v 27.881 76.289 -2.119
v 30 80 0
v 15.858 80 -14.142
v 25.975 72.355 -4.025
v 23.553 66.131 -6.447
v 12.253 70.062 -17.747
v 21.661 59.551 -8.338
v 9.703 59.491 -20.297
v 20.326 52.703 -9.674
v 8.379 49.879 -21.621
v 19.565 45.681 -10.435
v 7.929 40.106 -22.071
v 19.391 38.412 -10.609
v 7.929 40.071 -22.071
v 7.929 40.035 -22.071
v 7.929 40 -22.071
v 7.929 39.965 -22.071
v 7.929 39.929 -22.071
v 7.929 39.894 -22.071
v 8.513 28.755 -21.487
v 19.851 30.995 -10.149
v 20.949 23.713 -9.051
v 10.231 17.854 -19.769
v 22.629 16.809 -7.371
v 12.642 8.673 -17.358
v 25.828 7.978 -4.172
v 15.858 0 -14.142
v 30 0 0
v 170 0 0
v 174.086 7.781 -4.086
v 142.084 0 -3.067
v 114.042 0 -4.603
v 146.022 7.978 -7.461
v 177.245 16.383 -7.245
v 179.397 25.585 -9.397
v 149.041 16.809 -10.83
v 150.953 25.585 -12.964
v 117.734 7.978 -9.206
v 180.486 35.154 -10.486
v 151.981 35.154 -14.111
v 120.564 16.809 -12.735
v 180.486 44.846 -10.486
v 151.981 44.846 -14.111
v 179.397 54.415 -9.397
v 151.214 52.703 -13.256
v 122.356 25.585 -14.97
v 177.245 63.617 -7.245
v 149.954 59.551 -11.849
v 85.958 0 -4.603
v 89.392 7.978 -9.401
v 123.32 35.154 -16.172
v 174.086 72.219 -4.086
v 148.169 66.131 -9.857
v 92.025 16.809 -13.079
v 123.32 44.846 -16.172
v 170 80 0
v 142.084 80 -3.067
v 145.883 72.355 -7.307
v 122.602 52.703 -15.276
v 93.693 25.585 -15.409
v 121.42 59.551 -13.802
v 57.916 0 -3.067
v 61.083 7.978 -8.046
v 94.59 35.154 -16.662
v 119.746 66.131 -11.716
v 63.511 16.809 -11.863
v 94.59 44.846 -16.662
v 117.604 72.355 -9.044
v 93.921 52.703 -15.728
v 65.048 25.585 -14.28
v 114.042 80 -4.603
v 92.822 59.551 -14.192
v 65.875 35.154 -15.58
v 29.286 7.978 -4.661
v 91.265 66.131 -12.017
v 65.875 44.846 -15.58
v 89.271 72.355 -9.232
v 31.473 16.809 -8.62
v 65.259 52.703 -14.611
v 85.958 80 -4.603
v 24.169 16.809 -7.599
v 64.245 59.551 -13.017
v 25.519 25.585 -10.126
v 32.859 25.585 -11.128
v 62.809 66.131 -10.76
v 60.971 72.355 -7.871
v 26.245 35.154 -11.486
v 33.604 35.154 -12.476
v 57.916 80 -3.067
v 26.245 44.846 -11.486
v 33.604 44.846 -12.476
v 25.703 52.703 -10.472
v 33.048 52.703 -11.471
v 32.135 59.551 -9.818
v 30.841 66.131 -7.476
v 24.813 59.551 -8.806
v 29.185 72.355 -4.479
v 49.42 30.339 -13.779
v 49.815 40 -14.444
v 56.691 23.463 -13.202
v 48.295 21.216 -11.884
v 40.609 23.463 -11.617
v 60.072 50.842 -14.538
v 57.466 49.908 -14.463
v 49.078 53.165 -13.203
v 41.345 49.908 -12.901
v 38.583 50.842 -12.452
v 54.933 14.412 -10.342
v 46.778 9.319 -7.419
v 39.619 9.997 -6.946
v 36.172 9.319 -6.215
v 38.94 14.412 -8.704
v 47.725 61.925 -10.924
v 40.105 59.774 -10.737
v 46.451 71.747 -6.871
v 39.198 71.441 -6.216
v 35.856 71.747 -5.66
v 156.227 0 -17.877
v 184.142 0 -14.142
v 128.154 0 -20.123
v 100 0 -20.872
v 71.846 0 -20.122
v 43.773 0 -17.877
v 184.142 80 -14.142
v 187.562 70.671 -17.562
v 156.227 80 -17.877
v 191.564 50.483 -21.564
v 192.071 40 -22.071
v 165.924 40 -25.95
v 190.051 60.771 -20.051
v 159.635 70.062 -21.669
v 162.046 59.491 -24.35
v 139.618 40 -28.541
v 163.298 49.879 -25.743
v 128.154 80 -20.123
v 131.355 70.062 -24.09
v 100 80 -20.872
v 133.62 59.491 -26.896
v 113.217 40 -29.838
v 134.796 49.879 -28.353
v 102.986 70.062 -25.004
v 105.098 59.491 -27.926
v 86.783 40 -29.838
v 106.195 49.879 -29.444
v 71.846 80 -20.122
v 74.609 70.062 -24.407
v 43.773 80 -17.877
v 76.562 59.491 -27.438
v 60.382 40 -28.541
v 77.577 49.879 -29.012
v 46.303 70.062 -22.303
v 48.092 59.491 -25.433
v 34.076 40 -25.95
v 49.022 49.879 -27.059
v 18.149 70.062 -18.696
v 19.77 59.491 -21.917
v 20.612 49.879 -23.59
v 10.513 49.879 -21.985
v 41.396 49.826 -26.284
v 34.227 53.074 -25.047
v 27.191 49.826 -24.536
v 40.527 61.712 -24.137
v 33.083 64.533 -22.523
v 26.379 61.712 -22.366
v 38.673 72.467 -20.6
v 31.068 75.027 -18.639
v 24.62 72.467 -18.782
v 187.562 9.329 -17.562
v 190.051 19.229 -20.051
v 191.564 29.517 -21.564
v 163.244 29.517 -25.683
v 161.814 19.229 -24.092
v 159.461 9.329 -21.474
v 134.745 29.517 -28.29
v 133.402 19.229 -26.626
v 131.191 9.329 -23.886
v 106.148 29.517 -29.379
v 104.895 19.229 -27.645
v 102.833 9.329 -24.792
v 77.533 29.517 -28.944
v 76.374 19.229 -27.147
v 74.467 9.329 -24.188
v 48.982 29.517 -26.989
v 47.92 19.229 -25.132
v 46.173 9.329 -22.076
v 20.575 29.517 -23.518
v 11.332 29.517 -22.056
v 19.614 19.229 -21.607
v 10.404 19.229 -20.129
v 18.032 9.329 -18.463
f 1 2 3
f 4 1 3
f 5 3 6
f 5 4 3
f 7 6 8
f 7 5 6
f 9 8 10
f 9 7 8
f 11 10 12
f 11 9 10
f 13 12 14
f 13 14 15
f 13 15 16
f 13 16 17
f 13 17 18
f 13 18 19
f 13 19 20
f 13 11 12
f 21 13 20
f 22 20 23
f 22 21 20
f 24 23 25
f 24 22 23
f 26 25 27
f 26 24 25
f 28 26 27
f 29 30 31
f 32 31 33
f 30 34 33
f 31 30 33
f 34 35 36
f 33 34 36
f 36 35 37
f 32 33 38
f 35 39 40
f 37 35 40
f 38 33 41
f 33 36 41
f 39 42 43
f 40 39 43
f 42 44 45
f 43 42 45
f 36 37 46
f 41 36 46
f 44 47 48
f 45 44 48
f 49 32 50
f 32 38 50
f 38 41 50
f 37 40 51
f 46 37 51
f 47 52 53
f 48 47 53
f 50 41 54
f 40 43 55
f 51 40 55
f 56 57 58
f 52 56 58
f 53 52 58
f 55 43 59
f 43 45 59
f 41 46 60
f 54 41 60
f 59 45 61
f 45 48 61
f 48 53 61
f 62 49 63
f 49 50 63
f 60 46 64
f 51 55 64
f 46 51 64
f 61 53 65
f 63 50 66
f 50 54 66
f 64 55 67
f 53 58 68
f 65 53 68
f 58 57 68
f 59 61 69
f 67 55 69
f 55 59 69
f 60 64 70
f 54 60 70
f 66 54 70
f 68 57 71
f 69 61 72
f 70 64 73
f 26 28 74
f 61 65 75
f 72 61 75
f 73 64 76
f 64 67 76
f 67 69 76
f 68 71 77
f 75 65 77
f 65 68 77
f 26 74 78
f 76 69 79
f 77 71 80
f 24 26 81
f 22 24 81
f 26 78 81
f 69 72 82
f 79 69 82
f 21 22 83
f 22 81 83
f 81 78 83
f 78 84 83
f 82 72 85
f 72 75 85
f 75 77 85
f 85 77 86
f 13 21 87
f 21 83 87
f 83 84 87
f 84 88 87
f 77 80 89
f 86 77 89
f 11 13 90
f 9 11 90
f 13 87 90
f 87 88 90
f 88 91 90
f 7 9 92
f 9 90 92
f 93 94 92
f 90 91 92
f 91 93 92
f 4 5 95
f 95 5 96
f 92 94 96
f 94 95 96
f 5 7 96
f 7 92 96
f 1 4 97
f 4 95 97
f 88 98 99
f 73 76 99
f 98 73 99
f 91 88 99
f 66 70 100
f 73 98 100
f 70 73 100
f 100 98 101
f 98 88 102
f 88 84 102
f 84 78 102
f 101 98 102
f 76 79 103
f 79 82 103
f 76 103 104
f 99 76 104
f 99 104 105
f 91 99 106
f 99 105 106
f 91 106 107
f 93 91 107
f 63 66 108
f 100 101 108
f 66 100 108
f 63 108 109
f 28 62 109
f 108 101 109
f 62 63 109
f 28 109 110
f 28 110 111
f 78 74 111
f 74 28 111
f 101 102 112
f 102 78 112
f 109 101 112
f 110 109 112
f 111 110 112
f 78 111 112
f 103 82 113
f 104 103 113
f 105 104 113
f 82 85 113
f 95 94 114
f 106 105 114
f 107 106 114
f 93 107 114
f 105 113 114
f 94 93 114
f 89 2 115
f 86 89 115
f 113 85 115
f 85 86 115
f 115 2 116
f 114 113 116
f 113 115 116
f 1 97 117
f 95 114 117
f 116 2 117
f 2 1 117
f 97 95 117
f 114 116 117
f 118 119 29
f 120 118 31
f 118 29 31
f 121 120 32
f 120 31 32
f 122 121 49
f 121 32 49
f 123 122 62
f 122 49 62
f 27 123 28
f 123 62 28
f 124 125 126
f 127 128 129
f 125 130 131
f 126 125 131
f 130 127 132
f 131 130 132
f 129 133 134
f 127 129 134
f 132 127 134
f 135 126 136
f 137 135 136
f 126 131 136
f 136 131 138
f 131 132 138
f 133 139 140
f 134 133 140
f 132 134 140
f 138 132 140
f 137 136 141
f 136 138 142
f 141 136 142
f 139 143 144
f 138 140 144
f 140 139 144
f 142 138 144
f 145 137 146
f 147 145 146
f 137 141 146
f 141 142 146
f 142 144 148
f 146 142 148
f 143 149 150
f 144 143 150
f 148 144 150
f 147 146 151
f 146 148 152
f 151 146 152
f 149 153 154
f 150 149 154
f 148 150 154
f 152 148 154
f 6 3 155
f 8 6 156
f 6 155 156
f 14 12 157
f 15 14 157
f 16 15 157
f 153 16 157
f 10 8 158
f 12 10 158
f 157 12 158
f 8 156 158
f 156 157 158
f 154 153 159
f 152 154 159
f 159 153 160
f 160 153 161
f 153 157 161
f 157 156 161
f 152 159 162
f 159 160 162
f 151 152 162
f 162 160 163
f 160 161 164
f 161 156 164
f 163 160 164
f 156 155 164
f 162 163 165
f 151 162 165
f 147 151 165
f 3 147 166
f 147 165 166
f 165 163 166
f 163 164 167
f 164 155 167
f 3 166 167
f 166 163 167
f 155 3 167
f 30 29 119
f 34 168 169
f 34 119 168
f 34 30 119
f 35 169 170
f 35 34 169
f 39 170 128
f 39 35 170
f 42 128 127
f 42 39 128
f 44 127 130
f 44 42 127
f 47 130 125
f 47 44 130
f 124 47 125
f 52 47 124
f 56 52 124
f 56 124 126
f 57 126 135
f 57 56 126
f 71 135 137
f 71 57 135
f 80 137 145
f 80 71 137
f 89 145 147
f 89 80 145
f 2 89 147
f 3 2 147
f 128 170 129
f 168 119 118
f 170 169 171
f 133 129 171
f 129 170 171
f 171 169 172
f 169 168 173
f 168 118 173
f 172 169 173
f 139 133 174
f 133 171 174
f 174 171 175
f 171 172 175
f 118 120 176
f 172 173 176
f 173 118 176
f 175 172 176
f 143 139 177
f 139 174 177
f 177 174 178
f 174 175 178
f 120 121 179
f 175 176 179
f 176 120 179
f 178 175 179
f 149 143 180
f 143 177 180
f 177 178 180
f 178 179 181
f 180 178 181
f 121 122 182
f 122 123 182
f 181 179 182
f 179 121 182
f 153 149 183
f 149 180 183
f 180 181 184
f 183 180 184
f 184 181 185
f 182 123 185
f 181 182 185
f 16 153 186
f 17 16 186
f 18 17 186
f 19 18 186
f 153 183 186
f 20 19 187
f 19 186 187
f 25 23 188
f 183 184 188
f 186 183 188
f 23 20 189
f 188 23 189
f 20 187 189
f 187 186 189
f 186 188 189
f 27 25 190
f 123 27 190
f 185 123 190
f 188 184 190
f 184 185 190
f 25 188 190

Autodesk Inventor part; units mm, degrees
ref_plane "YZ Plane" through (0, 0, 0) normal (1, 0, 0) x (0, 1, 0)
ref_plane "XZ Plane" through (0, 0, 0) normal (0, 1, 0) x (-1, 0, 0)
ref_plane "XY Plane" through (0, 0, 0) normal (0, 0, 1) x (1, 0, 0)
sketch "Эскиз1" plane through (0, 0, 0) normal (0, 1, 0) x (-1, 0, 0)
  line L0 (0, 0) -> (-200, 0)
  line L1 (-200, 0) -> (-200, -30)
  line L2 (-200, -30) -> (0, -30)
  line L3 (0, -30) -> (0, 0)
  dimension "d0" = 200
  dimension "d1" = 30
extrude "Выдавливание1" add sketch "Эскиз1" along normal blind 80
chamfer "Фаска1" distance 30 angle 45 2 edges at (0, 40, 0) (200, 40, 0)
sketch "Эскиз3" plane through (0, 80, 0) normal (0, 1, 0) x (1, 0, 0)
  line L0 (200, 30) -> (170, 0) projected
  line L1 (200, 30) -> (0, 30) projected
  line L2 (30, 0) -> (0, 30) projected
  line L3 (30, 0) -> (170, 0) projected
  line L4 (30, 0) -> (0, 30) projected
  line L5 (15, 15) -> (7.9289, 22.0711)
  arc A0 (192.0711, 22.0711) -> (7.9289, 22.0711) centre (100, -508.5309) ccw
  line L6 (200, 30) -> (0, 30) projected
  line L7 (30, 0) -> (170, 0) projected
  arc A1 (170, 0) -> (30, 0) centre (100, -508.5309) ccw
  point P0 (0, 0)
  point P1 (100, 0)
  point P2 (100, 0)
  dimension "d11" = 10
extrude "Выдавливание3" cut sketch "Эскиз3" against normal through all contours L0 A0 L1 | A0 L2 L1 | L3 A1
sketch "Эскиз4" plane through (192.0711, 0, -22.0711) normal (0.7071068, 0, 0.7071068) x (0.7071068, 0, -0.7071068)
  line L0 (0, 0) -> (0, 80) projected
  line L1 (0, 80) -> (-31.2132, 80) projected
  line L2 (-31.2132, 80) -> (-31.2132, 0) projected
  line L3 (-31.2132, 0) -> (0, 0) projected
  line L4 (0, 80) -> (-130.2082, 80) projected
  arc A0 (-11.2132, 0) -> (-11.2132, 80) centre (-76.9511, 40) ccw
  arc A1 (-31.2132, 0) -> (-31.2132, 80) centre (-76.9511, 40) ccw
  line L5 (-31.2132, 0) -> (0, 0) projected
  line L6 (0, 0) -> (0, 80) projected
  line L7 (-31.2132, 80) -> (-11.2132, 80)
  line L8 (-31.2132, 0) -> (-11.2132, 0)
  point P0 (-151.4214, 0)
  point P1 (-31.2132, 40)
  dimension "d14" = 20
sketch3d "3D эскиз1"
  arc A0 (192.0711, 80, -22.0711) -> (7.9289, 80, -22.0711) centre (100, 80, 508.5309) ccw
sweep "Сдвиг1" cut profiles "Эскиз4" path "3D эскиз1" contours L3 A0 L0 | A0 L1 L0 | L2 A1
properties part number "dou_short_round" material "Красное дерево"
